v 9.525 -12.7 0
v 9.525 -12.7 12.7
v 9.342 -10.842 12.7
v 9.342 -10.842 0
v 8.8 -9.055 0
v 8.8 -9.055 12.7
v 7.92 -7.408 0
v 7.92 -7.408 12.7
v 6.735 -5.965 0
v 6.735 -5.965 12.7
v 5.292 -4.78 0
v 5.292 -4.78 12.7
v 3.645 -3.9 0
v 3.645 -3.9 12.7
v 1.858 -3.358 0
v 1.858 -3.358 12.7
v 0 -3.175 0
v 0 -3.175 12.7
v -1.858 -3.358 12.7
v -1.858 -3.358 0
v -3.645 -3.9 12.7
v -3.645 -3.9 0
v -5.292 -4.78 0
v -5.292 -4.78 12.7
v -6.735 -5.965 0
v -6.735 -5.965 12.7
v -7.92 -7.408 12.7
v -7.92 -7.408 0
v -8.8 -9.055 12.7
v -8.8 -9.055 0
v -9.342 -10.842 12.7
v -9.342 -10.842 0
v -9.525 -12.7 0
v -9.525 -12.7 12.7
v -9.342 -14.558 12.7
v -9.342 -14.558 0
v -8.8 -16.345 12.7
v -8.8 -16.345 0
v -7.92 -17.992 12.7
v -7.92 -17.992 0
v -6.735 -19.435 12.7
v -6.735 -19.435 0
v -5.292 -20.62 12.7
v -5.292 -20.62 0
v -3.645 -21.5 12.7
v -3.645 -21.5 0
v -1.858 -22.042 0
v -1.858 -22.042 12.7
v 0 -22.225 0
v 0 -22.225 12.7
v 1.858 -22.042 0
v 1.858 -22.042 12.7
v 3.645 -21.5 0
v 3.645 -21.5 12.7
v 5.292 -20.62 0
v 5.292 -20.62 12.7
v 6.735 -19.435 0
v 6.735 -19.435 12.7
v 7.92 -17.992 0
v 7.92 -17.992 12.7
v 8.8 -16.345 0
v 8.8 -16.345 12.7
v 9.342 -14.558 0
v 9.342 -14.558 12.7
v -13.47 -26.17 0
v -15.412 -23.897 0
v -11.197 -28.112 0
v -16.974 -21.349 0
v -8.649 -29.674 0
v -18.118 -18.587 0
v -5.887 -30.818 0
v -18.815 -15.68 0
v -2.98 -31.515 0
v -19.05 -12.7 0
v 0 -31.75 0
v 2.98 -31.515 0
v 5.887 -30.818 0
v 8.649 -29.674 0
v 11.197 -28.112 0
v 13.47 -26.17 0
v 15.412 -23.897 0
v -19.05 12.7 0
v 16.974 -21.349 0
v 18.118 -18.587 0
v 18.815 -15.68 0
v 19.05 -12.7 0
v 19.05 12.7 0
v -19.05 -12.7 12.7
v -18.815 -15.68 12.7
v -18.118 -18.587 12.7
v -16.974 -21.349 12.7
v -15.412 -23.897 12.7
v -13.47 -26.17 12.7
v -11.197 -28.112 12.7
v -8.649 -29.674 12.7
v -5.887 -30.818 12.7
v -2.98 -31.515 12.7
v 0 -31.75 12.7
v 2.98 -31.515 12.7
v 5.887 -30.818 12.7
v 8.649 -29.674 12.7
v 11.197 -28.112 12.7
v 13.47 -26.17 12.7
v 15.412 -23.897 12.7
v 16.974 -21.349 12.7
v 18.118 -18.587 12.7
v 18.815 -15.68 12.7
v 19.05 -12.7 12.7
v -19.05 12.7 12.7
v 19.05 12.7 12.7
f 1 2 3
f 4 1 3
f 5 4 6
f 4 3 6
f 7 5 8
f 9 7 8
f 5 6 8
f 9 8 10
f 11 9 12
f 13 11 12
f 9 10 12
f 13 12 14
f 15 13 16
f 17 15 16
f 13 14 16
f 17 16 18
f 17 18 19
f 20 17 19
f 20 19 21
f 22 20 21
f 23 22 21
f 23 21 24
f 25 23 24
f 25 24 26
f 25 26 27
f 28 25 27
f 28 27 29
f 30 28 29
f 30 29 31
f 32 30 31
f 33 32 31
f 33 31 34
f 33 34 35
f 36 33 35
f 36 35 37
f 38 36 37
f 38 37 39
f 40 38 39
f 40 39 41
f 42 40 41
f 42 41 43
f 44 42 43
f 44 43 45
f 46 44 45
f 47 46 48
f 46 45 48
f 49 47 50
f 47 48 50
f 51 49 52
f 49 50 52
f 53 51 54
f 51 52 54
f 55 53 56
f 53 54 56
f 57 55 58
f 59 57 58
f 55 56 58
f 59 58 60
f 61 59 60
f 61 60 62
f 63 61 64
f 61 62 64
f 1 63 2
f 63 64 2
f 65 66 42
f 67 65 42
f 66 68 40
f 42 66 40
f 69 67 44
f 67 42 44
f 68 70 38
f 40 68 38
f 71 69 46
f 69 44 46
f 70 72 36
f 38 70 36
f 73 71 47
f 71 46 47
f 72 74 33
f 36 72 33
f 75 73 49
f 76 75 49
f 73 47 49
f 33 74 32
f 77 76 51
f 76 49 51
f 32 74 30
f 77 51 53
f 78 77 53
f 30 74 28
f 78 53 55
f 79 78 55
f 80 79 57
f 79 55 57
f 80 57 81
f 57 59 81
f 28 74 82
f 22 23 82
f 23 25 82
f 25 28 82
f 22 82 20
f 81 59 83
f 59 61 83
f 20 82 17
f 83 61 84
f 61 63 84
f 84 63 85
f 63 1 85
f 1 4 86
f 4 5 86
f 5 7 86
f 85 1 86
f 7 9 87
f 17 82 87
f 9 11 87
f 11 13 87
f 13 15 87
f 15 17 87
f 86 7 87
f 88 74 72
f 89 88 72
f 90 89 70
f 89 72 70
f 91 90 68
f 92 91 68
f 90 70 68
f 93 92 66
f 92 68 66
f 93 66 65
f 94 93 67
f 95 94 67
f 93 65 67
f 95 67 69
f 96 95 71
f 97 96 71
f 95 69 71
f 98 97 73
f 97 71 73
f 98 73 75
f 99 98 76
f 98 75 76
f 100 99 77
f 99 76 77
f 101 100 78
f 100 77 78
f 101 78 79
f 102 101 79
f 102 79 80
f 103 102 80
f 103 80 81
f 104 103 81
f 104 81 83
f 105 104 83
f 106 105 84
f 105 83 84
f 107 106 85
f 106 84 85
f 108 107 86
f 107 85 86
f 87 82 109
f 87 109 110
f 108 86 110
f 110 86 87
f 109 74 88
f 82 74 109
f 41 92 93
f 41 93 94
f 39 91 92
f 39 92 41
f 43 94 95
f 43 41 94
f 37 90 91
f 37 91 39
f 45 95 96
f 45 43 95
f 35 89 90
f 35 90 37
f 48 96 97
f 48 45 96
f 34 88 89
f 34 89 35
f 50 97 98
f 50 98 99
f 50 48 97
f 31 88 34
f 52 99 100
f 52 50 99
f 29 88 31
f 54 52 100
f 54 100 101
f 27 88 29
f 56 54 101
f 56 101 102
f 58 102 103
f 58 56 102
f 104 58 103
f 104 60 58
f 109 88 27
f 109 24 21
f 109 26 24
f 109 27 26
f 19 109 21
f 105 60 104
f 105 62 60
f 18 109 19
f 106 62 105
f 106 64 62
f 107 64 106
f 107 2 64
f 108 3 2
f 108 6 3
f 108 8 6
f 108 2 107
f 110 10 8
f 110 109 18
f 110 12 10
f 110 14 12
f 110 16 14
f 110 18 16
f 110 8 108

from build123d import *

# Parameters (mm, degrees)
F0_W     = 38.1
F0_H     = 25.4
F1_DEPTH = 12.7
F2_R     = 9.525
F3_DEPTH = 12.701


with BuildPart() as f1:
    # F0 (on Top) → F1 (new body)
    with BuildSketch(Plane.XY):
        Rectangle(F0_W, F0_H)
        with BuildLine():
            Line((19.05, -12.7), (-19.05, -12.7))
            ThreePointArc((-19.05, -12.7), (0, -31.75), (19.05, -12.7))
        make_face()
    extrude(amount=F1_DEPTH)

    # F2 (on face) → F3 (cut, through all)
    with BuildSketch(Plane.XY.offset(12.7)):
        with Locations((0, -12.7)):
            Circle(F2_R)
    extrude(amount=-F3_DEPTH, mode=Mode.SUBTRACT)


solid = f1.part
